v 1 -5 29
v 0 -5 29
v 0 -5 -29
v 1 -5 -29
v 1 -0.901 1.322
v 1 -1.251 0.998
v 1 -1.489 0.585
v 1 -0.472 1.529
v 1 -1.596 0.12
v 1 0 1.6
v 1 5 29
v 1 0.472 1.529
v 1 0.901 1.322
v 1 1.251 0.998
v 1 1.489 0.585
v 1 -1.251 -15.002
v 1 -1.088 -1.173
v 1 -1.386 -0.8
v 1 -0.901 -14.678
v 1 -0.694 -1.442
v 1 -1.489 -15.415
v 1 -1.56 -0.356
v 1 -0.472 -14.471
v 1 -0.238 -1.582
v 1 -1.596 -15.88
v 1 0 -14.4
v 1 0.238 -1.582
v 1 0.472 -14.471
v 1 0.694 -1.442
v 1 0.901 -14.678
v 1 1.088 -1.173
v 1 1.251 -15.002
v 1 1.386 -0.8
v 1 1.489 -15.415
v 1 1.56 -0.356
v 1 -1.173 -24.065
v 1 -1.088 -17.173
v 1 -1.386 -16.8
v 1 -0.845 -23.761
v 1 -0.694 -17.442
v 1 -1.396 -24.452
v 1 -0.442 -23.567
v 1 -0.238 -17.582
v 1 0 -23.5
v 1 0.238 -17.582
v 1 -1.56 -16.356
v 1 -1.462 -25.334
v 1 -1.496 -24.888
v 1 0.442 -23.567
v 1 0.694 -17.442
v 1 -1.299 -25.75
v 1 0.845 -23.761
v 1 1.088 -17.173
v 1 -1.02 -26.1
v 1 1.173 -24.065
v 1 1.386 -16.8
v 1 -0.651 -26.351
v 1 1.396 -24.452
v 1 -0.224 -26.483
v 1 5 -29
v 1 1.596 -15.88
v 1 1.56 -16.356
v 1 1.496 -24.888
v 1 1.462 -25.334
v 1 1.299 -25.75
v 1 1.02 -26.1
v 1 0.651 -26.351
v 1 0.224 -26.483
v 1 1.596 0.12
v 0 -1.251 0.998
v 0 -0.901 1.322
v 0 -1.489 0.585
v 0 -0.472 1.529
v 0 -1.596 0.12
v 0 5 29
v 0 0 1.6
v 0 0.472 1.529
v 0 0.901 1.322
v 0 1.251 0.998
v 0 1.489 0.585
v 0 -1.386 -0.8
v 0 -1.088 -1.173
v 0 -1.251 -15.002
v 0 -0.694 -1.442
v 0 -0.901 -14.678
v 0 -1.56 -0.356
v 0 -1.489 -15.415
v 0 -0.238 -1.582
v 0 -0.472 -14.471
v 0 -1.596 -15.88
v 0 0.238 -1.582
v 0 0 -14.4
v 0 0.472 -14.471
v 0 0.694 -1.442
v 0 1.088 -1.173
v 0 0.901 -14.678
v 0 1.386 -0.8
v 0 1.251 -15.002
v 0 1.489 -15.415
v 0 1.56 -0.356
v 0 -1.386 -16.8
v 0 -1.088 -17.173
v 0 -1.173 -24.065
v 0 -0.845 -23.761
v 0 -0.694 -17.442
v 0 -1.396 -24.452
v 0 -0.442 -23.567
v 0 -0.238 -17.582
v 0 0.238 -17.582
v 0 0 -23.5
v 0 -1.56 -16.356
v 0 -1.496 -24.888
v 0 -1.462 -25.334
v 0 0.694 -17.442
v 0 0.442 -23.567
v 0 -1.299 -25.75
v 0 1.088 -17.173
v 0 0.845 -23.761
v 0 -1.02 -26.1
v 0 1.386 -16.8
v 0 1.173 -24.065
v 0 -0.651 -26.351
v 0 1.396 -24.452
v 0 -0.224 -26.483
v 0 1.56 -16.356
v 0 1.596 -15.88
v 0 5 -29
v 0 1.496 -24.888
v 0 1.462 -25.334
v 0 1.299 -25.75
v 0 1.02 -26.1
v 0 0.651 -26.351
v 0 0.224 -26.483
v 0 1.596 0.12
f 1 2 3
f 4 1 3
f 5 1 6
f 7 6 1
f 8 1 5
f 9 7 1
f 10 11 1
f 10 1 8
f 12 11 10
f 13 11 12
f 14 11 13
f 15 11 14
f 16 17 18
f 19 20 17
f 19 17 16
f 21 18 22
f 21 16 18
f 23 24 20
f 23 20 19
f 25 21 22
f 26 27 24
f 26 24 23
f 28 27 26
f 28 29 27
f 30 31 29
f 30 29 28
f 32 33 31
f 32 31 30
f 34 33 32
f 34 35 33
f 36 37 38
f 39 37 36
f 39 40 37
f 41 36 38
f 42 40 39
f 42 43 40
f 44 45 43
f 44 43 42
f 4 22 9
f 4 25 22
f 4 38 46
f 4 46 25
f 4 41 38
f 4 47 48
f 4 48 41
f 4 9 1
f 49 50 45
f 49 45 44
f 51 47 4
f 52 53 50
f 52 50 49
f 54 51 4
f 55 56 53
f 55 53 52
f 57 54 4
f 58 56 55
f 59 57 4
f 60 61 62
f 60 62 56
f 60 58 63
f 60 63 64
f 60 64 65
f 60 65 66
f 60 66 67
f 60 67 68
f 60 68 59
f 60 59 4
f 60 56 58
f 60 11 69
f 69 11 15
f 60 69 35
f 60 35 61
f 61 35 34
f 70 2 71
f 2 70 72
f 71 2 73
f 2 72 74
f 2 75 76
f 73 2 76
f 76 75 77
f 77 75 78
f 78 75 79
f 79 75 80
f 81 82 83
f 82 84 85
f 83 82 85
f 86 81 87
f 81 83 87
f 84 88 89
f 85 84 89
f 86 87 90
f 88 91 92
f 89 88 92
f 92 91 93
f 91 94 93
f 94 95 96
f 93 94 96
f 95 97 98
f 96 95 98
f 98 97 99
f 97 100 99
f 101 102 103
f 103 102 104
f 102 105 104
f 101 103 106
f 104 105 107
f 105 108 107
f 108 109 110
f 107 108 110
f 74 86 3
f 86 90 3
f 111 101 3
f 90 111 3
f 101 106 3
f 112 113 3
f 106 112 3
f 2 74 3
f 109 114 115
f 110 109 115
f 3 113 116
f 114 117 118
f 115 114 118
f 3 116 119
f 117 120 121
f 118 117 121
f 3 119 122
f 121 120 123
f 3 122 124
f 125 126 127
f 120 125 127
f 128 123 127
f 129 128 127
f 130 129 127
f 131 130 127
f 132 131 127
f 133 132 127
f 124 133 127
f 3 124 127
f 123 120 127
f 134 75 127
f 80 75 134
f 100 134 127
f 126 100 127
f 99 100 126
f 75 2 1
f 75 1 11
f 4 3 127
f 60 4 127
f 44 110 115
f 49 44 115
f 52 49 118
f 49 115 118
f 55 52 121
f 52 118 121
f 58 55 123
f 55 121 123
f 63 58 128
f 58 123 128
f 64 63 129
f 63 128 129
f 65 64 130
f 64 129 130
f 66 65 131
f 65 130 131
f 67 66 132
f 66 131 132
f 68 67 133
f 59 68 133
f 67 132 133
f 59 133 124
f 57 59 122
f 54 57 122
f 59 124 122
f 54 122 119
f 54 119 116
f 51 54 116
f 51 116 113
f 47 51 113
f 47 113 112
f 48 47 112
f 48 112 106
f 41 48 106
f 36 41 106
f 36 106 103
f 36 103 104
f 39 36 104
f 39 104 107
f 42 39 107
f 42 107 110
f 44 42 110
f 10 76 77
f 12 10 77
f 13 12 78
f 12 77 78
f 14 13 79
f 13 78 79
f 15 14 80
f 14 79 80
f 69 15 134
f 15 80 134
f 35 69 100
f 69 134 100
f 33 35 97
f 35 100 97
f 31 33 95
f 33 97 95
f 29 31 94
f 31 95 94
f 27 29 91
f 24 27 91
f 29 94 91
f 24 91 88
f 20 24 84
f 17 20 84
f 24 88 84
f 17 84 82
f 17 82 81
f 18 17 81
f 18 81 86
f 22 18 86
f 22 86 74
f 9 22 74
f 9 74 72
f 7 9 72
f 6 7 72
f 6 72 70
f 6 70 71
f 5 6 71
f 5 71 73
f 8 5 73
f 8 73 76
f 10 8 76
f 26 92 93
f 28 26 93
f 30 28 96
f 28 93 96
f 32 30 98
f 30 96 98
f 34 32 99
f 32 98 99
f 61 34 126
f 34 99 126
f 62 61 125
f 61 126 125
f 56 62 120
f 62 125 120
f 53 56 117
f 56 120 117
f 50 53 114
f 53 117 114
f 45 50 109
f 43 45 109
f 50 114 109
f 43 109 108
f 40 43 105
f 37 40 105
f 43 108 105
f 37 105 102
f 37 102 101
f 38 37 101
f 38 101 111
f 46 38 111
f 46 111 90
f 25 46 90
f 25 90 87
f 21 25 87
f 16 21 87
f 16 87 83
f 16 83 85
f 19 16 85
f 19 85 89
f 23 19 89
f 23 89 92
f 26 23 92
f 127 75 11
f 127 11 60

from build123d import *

# Parameters (mm, degrees)
SKETCH_1_W           = 58
SKETCH_1_H           = 10
EXTRUDE_1_DEPTH      = 1
HOLE_WIZARD_M3_1_D   = 3.2
HOLE_WIZARD_M3_1_2_D = 3


with BuildPart() as part:
    # 草图1 → 凸台-拉伸1 (new body)
    with BuildSketch(Plane(origin=(0, 0, 0), x_dir=(0, 0, -1), z_dir=(1, 0, 0))):
        Rectangle(SKETCH_1_W, SKETCH_1_H)
    extrude(amount=EXTRUDE_1_DEPTH)

    # Hole Wizard M3 _1 (through all)
    with Locations(Plane(origin=(1, 0, 0), x_dir=(0, 0, -1), z_dir=(1, 0, 0))):
        with Locations((16, 0), (0, 0)):
            Hole(HOLE_WIZARD_M3_1_D / 2)

    # Hole Wizard M3 _1 2 (through all)
    with Locations(Plane(origin=(1, 0, 0), x_dir=(0, 0, -1), z_dir=(1, 0, 0))):
        with Locations((25, 0)):
            Hole(HOLE_WIZARD_M3_1_2_D / 2)


solid = part.part
